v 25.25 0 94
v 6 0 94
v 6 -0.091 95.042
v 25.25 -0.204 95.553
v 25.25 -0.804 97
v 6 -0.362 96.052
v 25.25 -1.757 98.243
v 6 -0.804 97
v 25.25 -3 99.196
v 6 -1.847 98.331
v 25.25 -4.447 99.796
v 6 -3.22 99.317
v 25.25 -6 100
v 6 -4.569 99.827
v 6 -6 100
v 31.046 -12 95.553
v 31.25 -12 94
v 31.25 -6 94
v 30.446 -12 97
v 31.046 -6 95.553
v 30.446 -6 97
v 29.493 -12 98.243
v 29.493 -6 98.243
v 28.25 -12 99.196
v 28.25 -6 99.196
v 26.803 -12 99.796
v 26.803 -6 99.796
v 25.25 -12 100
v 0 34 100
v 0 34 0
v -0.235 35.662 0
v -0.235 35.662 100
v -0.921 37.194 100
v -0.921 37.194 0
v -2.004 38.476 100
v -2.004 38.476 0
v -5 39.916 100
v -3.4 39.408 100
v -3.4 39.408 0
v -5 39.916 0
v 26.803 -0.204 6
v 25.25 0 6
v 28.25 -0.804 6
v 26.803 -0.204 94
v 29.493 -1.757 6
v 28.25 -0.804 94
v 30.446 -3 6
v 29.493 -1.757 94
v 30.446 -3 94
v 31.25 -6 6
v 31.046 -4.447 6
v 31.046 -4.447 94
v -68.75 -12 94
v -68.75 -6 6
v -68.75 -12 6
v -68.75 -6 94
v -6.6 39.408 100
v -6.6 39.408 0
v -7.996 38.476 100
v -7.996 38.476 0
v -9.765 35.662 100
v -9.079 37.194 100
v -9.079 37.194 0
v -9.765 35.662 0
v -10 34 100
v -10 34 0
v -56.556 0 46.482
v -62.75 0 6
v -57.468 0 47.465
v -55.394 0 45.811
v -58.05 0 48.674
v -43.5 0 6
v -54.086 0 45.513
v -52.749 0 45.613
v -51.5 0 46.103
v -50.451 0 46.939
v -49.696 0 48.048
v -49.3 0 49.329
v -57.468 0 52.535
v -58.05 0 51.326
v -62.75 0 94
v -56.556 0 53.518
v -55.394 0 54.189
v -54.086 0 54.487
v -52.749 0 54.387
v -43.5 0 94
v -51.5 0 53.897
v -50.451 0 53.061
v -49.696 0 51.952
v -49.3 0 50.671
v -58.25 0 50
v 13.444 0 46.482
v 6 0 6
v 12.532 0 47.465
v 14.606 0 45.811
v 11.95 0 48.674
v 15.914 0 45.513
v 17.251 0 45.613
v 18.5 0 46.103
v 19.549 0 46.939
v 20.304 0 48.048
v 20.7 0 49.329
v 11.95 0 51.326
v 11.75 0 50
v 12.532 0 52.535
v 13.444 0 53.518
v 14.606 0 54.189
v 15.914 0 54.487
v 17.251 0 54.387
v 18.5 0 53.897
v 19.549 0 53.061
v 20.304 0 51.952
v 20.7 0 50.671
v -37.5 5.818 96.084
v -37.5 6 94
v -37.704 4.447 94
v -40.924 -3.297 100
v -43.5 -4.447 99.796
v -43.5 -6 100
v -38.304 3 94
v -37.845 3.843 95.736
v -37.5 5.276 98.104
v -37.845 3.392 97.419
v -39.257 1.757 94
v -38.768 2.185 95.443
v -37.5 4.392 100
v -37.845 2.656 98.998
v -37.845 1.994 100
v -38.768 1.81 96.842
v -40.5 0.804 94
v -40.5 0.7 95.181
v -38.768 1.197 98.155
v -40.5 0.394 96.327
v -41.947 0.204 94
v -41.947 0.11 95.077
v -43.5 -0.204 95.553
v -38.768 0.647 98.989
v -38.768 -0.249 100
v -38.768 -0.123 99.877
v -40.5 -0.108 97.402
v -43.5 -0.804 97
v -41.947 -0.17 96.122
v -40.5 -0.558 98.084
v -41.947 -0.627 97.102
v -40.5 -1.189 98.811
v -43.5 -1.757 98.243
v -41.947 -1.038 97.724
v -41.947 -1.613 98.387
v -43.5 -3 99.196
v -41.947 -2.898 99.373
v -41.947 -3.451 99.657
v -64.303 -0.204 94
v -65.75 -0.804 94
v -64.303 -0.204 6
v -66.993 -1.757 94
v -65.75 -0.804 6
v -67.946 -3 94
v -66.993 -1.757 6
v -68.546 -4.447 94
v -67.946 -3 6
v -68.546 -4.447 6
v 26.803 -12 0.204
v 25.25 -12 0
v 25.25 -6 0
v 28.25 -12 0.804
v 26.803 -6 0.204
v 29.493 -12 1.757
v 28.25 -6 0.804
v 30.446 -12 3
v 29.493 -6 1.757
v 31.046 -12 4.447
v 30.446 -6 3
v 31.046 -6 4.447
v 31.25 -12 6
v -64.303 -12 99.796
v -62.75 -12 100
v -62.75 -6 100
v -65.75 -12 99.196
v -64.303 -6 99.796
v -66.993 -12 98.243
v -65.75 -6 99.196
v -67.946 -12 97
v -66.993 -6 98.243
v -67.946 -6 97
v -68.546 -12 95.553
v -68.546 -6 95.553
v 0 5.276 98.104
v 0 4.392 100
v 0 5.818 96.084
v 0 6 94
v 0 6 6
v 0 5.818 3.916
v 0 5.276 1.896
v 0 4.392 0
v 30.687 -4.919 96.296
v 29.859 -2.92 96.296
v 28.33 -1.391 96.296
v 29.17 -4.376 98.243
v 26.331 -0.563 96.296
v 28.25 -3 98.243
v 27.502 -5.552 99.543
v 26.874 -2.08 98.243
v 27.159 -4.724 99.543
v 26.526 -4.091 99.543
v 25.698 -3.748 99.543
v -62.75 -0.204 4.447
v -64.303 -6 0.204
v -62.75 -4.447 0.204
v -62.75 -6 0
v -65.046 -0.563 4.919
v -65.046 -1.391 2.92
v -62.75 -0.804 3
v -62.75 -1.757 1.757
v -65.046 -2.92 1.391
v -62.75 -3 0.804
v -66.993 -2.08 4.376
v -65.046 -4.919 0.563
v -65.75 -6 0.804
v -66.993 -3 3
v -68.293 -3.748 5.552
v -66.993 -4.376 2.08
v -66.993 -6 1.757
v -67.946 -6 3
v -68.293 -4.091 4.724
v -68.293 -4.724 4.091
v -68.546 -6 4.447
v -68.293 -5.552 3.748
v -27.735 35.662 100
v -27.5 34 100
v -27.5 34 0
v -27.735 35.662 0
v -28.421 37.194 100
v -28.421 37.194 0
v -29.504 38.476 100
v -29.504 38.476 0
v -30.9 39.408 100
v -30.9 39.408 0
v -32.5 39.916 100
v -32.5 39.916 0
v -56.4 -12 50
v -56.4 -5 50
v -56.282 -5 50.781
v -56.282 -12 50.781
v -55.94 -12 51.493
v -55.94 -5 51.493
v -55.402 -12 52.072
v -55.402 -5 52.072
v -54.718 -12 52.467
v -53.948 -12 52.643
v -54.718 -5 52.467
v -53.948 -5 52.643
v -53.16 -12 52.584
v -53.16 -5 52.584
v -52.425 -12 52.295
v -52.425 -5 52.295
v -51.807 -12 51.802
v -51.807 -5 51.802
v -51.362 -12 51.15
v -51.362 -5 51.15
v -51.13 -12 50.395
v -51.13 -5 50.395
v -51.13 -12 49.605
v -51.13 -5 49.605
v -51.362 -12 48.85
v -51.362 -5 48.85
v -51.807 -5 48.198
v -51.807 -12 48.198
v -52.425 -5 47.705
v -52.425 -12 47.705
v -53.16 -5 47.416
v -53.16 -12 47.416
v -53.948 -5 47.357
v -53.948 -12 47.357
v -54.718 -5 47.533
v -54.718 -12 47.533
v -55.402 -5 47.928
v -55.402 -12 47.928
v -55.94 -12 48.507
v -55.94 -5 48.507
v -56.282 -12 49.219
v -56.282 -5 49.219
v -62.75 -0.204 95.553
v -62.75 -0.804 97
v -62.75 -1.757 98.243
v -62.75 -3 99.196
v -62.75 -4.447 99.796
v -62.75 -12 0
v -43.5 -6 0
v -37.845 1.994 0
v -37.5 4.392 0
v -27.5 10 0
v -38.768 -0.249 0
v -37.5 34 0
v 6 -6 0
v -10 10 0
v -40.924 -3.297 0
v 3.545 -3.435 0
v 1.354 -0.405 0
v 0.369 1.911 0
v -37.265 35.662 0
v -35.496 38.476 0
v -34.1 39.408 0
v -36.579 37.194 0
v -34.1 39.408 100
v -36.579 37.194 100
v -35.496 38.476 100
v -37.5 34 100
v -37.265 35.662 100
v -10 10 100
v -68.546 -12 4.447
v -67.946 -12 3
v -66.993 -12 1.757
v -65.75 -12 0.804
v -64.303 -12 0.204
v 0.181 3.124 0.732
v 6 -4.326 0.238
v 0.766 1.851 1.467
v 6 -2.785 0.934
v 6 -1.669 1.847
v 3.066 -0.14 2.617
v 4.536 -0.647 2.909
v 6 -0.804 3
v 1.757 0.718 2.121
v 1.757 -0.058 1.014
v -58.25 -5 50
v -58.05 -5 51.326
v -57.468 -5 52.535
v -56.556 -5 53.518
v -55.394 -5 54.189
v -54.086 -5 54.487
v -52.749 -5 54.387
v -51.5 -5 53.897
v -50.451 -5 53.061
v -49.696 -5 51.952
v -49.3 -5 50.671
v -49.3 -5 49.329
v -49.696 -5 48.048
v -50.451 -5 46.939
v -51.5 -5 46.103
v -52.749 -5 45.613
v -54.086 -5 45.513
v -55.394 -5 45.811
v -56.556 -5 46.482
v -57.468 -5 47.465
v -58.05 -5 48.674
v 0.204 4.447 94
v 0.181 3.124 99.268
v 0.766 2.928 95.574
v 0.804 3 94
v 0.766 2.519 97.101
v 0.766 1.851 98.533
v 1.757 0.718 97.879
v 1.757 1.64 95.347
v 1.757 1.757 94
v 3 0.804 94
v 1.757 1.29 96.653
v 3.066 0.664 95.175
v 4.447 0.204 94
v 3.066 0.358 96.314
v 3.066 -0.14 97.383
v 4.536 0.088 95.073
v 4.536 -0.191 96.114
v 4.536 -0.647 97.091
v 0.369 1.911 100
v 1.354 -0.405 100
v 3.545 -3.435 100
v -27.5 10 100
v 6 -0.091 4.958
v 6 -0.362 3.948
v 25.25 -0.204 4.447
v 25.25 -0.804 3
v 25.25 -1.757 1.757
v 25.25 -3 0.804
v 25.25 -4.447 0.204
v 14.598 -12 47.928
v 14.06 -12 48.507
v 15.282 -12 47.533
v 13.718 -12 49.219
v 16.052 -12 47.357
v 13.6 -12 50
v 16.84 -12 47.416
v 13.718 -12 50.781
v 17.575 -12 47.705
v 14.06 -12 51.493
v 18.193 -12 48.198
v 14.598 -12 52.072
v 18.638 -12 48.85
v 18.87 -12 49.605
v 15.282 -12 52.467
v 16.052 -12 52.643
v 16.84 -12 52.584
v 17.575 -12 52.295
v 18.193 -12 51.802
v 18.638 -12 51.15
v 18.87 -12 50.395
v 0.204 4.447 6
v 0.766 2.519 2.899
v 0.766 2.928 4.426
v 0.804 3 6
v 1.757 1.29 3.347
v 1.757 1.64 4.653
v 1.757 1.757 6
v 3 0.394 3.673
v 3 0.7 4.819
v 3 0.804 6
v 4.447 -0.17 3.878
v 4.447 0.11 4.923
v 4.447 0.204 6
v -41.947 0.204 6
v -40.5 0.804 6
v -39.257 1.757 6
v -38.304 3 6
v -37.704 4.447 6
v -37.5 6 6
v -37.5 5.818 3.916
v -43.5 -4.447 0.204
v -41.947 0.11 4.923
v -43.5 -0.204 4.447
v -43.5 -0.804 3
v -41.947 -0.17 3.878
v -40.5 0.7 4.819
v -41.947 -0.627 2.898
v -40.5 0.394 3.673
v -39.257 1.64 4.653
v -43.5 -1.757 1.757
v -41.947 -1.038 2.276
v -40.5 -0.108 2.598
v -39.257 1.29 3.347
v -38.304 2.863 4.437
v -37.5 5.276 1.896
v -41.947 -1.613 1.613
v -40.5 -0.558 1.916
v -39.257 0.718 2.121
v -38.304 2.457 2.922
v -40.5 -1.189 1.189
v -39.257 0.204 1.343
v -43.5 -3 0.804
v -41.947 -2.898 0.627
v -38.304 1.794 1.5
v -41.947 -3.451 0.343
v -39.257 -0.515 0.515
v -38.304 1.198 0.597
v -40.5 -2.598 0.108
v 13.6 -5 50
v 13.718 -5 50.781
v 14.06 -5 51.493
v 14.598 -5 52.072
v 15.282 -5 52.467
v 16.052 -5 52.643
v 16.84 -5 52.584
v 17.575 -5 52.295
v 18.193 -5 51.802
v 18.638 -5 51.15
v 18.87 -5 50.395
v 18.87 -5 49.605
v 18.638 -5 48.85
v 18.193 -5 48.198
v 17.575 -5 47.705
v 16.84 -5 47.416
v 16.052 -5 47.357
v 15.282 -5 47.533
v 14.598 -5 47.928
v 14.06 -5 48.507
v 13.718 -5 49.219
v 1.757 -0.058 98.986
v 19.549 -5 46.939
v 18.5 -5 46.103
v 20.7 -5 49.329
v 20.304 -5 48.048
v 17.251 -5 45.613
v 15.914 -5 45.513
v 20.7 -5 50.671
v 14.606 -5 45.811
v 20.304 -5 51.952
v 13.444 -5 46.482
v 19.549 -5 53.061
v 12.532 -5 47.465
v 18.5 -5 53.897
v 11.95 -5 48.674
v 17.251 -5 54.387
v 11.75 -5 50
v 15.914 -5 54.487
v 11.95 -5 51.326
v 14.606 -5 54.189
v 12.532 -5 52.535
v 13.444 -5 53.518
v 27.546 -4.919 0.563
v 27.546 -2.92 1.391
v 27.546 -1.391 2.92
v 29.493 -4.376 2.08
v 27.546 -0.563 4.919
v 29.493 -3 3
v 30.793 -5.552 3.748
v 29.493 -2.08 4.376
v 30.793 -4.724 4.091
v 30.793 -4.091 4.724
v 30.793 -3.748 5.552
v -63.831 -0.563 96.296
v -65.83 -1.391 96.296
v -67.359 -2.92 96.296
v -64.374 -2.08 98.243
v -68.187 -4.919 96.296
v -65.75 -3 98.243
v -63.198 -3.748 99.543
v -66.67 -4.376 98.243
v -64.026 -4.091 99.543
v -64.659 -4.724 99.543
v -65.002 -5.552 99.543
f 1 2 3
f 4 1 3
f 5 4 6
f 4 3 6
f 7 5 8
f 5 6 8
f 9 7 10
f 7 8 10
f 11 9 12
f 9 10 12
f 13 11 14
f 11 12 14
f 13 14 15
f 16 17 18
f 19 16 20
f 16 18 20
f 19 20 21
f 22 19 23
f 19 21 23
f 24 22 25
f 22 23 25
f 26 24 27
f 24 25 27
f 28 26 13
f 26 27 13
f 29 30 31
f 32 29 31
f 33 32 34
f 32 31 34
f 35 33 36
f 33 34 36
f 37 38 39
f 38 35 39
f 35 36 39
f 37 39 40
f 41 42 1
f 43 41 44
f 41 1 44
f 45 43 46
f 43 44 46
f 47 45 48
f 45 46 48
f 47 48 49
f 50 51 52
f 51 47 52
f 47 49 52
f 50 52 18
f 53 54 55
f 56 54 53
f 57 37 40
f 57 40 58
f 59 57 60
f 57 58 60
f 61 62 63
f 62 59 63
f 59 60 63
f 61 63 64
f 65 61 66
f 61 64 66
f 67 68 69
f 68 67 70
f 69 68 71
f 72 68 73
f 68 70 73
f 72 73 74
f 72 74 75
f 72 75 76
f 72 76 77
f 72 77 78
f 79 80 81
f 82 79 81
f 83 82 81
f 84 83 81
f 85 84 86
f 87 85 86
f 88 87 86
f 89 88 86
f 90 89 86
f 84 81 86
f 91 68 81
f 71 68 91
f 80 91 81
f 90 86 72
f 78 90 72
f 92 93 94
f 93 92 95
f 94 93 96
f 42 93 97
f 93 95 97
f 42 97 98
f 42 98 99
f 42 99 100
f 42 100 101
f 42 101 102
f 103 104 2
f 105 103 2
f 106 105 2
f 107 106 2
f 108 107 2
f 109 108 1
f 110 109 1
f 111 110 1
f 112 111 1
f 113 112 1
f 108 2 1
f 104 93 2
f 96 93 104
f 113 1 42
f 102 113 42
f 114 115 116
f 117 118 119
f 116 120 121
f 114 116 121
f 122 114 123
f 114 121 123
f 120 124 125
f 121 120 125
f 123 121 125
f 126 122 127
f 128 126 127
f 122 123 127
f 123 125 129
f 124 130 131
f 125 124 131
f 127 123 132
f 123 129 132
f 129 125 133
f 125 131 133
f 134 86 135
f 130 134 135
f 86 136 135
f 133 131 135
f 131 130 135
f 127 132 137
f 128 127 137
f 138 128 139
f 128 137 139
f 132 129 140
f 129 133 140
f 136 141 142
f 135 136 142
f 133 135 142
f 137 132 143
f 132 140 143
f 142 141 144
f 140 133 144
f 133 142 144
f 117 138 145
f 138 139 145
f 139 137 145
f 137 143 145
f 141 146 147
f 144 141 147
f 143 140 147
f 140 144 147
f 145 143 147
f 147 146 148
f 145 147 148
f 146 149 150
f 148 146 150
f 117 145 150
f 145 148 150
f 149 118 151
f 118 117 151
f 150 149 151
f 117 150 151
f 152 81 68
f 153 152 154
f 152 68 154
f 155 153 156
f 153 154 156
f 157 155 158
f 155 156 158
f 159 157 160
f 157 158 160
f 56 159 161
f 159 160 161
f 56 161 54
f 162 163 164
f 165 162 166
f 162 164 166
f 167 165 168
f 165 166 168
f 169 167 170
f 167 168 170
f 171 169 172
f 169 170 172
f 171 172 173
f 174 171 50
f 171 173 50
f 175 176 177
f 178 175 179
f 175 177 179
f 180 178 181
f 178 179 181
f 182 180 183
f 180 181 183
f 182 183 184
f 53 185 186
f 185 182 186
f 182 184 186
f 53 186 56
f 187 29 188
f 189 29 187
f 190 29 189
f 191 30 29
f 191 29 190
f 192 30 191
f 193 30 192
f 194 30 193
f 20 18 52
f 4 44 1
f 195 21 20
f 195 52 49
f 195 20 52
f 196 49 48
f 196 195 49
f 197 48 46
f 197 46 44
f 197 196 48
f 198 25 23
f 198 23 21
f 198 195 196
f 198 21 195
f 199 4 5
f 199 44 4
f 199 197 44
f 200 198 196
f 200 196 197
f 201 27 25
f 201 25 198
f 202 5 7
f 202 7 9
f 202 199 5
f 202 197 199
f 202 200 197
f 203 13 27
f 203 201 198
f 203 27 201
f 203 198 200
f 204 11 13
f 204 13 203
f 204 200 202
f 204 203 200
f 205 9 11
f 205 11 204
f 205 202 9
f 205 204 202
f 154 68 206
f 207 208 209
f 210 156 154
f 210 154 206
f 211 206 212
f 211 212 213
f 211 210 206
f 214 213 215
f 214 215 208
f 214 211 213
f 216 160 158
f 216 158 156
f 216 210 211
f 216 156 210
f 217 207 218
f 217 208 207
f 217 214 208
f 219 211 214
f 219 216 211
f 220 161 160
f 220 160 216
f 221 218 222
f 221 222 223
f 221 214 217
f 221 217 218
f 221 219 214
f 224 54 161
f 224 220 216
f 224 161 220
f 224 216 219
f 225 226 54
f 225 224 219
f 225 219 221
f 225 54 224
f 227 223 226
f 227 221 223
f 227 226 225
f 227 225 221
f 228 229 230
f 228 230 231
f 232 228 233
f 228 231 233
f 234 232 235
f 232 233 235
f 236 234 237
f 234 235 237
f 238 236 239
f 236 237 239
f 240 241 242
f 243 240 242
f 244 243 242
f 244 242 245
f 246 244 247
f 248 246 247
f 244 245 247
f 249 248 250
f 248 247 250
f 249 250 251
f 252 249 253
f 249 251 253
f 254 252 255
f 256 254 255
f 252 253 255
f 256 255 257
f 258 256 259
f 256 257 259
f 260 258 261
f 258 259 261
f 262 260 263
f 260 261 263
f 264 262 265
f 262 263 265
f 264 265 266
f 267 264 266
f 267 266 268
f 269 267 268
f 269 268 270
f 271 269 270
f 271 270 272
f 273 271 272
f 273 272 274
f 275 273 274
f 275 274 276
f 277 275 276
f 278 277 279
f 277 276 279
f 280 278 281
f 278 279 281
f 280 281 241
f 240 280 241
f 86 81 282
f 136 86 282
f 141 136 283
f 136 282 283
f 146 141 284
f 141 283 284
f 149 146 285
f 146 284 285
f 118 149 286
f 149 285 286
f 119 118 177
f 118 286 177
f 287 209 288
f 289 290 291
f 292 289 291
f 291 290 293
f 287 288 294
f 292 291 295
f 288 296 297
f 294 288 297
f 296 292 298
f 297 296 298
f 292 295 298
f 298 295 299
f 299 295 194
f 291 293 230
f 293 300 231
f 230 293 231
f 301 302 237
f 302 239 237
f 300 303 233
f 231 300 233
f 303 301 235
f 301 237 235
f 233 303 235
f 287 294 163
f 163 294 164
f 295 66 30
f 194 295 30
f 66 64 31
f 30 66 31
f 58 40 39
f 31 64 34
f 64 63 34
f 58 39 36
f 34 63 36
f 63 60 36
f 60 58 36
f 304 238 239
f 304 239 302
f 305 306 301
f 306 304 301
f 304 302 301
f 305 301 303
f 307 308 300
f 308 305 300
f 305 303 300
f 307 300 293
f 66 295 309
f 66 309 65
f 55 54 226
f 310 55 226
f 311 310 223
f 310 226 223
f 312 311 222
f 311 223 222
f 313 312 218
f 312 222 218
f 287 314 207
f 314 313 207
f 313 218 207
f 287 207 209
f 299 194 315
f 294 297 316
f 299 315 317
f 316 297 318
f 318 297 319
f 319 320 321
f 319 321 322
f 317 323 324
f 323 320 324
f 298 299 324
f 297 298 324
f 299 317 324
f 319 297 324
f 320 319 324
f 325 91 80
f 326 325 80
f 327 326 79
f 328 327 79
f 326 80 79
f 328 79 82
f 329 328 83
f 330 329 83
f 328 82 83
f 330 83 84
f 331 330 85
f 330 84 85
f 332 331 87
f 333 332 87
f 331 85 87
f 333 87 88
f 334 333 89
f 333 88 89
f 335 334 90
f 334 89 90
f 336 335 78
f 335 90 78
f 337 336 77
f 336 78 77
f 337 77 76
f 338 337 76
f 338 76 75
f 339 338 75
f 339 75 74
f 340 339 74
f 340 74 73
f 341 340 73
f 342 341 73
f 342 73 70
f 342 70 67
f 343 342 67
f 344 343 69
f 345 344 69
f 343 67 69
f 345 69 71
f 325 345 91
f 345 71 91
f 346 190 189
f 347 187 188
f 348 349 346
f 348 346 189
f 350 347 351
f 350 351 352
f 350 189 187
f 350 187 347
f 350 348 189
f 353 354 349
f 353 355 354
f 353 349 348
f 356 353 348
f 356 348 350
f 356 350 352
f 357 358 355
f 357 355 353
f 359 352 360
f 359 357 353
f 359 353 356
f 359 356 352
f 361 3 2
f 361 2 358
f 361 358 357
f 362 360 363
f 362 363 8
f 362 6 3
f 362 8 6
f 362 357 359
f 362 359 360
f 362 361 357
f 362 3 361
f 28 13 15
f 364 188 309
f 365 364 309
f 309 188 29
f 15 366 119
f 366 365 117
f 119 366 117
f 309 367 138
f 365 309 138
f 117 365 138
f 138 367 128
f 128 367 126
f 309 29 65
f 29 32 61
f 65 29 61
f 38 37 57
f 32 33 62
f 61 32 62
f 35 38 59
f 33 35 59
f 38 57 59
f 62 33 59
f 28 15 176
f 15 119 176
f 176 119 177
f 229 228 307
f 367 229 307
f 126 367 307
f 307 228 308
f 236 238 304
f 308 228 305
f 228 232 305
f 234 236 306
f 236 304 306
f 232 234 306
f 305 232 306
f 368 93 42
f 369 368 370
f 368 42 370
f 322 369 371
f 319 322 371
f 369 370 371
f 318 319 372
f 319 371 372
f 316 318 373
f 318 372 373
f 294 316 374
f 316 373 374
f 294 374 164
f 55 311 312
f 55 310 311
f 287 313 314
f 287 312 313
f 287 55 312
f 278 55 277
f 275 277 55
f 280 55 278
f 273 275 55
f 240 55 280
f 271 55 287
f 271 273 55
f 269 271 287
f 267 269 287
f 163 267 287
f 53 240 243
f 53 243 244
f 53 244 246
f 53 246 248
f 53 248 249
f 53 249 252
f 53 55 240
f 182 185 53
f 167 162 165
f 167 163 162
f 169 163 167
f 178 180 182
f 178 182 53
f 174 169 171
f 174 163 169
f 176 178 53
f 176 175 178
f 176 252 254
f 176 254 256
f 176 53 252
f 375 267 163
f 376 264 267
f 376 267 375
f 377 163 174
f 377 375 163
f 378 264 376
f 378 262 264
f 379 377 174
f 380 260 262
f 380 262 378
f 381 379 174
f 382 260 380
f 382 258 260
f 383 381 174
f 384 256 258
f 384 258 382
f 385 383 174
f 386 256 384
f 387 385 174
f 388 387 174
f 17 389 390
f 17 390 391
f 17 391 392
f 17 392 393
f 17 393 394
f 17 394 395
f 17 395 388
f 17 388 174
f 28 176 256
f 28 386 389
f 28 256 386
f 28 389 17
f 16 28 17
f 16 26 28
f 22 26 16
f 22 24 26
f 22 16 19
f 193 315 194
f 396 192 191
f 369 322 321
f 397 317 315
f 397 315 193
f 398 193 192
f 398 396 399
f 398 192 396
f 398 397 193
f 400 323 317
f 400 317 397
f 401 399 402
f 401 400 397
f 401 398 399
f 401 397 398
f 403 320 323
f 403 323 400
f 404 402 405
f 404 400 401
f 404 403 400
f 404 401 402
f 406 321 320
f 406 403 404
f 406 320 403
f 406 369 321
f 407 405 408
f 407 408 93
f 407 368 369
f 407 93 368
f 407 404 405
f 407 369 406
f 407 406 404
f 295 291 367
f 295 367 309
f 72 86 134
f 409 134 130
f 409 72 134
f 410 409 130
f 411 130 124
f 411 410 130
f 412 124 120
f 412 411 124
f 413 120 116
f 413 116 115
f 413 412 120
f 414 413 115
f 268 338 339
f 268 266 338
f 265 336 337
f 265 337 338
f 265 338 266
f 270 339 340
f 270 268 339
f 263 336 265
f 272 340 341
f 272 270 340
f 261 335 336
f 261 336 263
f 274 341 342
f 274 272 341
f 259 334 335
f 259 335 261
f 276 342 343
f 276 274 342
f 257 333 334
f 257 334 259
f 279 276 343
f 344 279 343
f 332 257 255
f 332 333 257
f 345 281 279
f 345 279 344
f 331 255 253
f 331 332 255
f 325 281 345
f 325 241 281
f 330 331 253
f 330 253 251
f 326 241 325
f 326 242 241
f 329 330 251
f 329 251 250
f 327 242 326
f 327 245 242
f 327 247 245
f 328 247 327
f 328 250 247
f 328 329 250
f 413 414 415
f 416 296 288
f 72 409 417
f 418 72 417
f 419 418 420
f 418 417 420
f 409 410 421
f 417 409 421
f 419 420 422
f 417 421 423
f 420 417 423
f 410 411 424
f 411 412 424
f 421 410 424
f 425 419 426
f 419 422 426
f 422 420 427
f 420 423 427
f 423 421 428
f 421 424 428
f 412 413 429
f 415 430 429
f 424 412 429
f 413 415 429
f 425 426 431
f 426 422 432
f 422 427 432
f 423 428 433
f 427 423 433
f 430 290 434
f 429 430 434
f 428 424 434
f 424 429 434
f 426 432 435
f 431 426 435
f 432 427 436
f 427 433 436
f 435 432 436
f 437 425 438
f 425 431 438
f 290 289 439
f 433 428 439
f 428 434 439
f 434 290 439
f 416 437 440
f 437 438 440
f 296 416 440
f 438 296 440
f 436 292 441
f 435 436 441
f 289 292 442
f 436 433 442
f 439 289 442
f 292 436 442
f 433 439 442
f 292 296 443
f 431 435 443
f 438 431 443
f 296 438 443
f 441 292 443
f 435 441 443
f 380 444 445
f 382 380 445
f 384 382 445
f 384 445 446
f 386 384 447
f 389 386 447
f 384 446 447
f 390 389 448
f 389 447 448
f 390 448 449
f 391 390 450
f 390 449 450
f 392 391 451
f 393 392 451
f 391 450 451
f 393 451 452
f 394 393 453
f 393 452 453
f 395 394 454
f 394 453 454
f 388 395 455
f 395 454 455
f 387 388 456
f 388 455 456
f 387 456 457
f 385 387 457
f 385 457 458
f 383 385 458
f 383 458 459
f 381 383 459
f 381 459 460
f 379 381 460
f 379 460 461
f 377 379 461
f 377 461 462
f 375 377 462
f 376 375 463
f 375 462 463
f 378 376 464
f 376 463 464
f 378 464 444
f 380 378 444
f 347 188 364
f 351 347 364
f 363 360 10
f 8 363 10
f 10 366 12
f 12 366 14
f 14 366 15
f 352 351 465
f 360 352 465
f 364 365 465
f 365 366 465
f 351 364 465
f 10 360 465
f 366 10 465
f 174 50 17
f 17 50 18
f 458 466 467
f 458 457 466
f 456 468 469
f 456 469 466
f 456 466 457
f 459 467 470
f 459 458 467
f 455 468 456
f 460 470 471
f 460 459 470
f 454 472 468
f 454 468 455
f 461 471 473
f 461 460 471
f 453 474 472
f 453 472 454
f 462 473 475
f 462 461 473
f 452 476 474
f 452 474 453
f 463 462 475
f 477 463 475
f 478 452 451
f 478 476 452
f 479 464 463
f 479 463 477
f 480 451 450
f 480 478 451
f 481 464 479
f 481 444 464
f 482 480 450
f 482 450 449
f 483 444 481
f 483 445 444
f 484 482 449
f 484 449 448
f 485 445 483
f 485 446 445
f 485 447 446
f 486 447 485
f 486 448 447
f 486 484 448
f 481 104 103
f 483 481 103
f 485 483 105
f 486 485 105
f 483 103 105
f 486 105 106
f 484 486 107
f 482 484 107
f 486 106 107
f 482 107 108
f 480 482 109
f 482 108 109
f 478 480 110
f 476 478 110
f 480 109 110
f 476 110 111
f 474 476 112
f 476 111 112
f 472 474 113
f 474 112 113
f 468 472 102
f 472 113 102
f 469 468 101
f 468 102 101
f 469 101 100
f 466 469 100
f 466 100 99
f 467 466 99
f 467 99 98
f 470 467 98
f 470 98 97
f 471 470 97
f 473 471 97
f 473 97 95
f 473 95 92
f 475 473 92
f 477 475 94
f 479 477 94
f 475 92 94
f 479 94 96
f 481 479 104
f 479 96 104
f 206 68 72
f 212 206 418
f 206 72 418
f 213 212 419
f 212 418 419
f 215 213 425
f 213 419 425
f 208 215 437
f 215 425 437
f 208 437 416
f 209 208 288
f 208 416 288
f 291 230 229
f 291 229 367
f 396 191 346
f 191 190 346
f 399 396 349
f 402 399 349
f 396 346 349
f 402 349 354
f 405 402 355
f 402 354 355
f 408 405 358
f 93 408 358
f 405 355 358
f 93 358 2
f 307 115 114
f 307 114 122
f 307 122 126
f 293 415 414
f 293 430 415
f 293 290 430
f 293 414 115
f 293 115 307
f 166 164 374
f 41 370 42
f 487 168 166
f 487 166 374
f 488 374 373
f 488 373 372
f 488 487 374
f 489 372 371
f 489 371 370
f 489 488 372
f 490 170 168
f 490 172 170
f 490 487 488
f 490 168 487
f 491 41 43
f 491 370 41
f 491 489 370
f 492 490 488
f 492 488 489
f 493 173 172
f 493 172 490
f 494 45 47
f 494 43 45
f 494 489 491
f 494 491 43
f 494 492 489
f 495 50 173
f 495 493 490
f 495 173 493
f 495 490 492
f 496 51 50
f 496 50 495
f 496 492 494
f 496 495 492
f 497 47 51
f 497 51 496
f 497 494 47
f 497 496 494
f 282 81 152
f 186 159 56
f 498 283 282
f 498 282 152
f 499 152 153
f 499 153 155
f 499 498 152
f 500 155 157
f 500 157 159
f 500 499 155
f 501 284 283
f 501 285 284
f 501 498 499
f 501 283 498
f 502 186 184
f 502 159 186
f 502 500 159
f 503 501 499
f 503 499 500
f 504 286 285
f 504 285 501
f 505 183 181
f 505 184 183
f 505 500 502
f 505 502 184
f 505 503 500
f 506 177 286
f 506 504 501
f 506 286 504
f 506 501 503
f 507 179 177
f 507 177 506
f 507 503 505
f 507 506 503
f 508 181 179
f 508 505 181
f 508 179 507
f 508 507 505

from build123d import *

# Parameters (mm, degrees)
BOSS_EXTRUDE1_DEPTH = 100
SKETCH2_W           = 100
SKETCH2_H           = 100
BOSS_EXTRUDE2_DEPTH = 12
SKETCH3_R           = 4.5
CUT_EXTRUDE1_DEPTH  = 5
SKETCH4_R           = 2.65
CUT_EXTRUDE2_DEPTH  = 7
FILLET1_R           = 6
FILLET3_R           = 6
FILLET4_R           = 6


with BuildPart() as part:
    # Sketch1 → Boss-Extrude1 (new body)
    with BuildSketch(Plane.XY):
        Polygon((0, 0), (-37.5, 0), (-37.5, 40), (-27.5, 40), (-27.5, 10), (-10, 10), (-10, 40), (0, 40), align=None)
    extrude(amount=BOSS_EXTRUDE1_DEPTH)

    # Sketch2 → Boss-Extrude2 (add)
    with BuildSketch(Plane.XZ):
        with Locations((-18.75, 50)):
            Rectangle(SKETCH2_W, SKETCH2_H)
    extrude(amount=BOSS_EXTRUDE2_DEPTH)

    # Sketch3 → Cut-Extrude1 (cut)
    with BuildSketch(Plane(origin=(0, 0, 0), x_dir=(1, 0, 0), z_dir=(0, 1, 0))):
        with Locations(Location((16.25, -50, 0), (0, 0, 180))):
            Circle(SKETCH3_R)
        with Locations(Location((-53.75, -50, 0), (0, 0, 180))):
            Circle(SKETCH3_R)
    extrude(amount=-CUT_EXTRUDE1_DEPTH, mode=Mode.SUBTRACT)

    # Sketch4 → Cut-Extrude2 (cut)
    with BuildSketch(Plane(origin=(0, -5, 0), x_dir=(1, 0, 0), z_dir=(0, 1, 0))):
        with Locations(Location((16.25, -50, 0), (0, 0, 180))):
            Circle(SKETCH4_R)
        with Locations(Location((-53.75, -50, 0), (0, 0, 180))):
            Circle(SKETCH4_R)
    extrude(amount=-CUT_EXTRUDE2_DEPTH, mode=Mode.SUBTRACT)

    # Fillet1
    # the kernel refuses this fillet: 6 mm, written as the material it takes off along each edge
    with BuildSketch(Plane(origin=(25.25, -6, 6), x_dir=(0, 1, 0), z_dir=(1, 0, 0))) as fillet1_piece_1_section:
        Polygon((0, 0), (FILLET1_R, 0), (FILLET1_R, -FILLET1_R), (0, -FILLET1_R), align=None)
    fillet1_piece_1 = extrude(amount=FILLET1_R, mode=Mode.PRIVATE)
    fillet1_piece_1 = fillet1_piece_1 - Plane(origin=(25.25, -6, 6), x_dir=(0, -0.7071067811865475, 0.7071067811865475), z_dir=(1, 0, 0)) * Sphere(FILLET1_R, mode=Mode.PRIVATE)
    add(fillet1_piece_1, mode=Mode.SUBTRACT)
    with BuildSketch(Plane(origin=(25.25, -6, 94), x_dir=(1, 0, 0), z_dir=(0, 0, 1))) as fillet1_piece_2_section:
        Polygon((0, 0), (FILLET1_R, 0), (FILLET1_R, FILLET1_R), (0, FILLET1_R), align=None)
    fillet1_piece_2 = extrude(amount=FILLET1_R, mode=Mode.PRIVATE)
    fillet1_piece_2 = fillet1_piece_2 - Plane(origin=(25.25, -6, 94), x_dir=(-0.7071067811865474, -0.7071067811865477, 0), z_dir=(0, 0, 1)) * Sphere(FILLET1_R, mode=Mode.PRIVATE)
    add(fillet1_piece_2, mode=Mode.SUBTRACT)
    with BuildSketch(Plane(origin=(-62.75, -6, 94), x_dir=(-1, 0, 0), z_dir=(0, 0, 1))) as fillet1_piece_3_section:
        Polygon((0, 0), (FILLET1_R, 0), (FILLET1_R, -FILLET1_R), (0, -FILLET1_R), align=None)
    fillet1_piece_3 = extrude(amount=FILLET1_R, mode=Mode.PRIVATE)
    fillet1_piece_3 = fillet1_piece_3 - Plane(origin=(-62.75, -6, 94), x_dir=(0.7071067811865477, -0.7071067811865474, 0), z_dir=(0, 0, 1)) * Sphere(FILLET1_R, mode=Mode.PRIVATE)
    add(fillet1_piece_3, mode=Mode.SUBTRACT)
    with BuildSketch(Plane(origin=(-62.75, -6, 6), x_dir=(0, 1, 0), z_dir=(-1, 0, 0))) as fillet1_piece_4_section:
        Polygon((0, 0), (FILLET1_R, 0), (FILLET1_R, FILLET1_R), (0, FILLET1_R), align=None)
    fillet1_piece_4 = extrude(amount=FILLET1_R, mode=Mode.PRIVATE)
    fillet1_piece_4 = fillet1_piece_4 - Plane(origin=(-62.75, -6, 6), x_dir=(0, -0.7071067811865475, 0.7071067811865475), z_dir=(-1, 0, 0)) * Sphere(FILLET1_R, mode=Mode.PRIVATE)
    add(fillet1_piece_4, mode=Mode.SUBTRACT)
    with BuildSketch(Plane(origin=(31.25, -6, 0), x_dir=(0, 0, 1), z_dir=(0, -1, 0)), Plane(origin=(31.25, -6, 100), x_dir=(-1, 0, 0), z_dir=(0, -1, 0))) as fillet1_piece_5:
        with BuildLine():
            CenterArc((FILLET1_R, FILLET1_R), FILLET1_R, 180, 90)
            Line((0, FILLET1_R), (0, 0))
            Line((0, 0), (FILLET1_R, 0))
        make_face()
    extrude(amount=21, mode=Mode.SUBTRACT)
    with BuildSketch(Plane(origin=(25.25, 0, 0), x_dir=(0, 0, 1), z_dir=(-1, 0, 0)), Plane(origin=(-37.5, 0, 0), x_dir=(0, 0, 1), z_dir=(-1, 0, 0))) as fillet1_piece_6:
        with BuildLine():
            CenterArc((FILLET1_R, -FILLET1_R), FILLET1_R, 90, 90)
            Line((0, -FILLET1_R), (0, 0))
            Line((0, 0), (FILLET1_R, 0))
        make_face()
    extrude(amount=25.25, mode=Mode.SUBTRACT)
    with BuildSketch(Plane(origin=(31.25, 0, 94), x_dir=(0, -1, 0), z_dir=(0, 0, -1)), Plane(origin=(-68.75, 0, 6), x_dir=(0, -1, 0), z_dir=(0, 0, 1))) as fillet1_piece_7:
        with BuildLine():
            CenterArc((FILLET1_R, FILLET1_R), FILLET1_R, 180, 90)
            Line((0, FILLET1_R), (0, 0))
            Line((0, 0), (FILLET1_R, 0))
        make_face()
    extrude(amount=88, mode=Mode.SUBTRACT)
    with BuildSketch(Plane(origin=(0, 0, 100), x_dir=(0, -1, 0), z_dir=(1, 0, 0)), Plane(origin=(-62.75, 0, 100), x_dir=(0, -1, 0), z_dir=(1, 0, 0))) as fillet1_piece_8:
        with BuildLine():
            CenterArc((FILLET1_R, FILLET1_R), FILLET1_R, 180, 90)
            Line((0, FILLET1_R), (0, 0))
            Line((0, 0), (FILLET1_R, 0))
        make_face()
    extrude(amount=25.25, mode=Mode.SUBTRACT)
    with BuildSketch(Plane(origin=(-68.75, -6, 100), x_dir=(1, 0, 0), z_dir=(0, -1, 0)), Plane(origin=(-68.75, -6, 0), x_dir=(0, 0, 1), z_dir=(0, -1, 0))) as fillet1_piece_9:
        with BuildLine():
            CenterArc((FILLET1_R, -FILLET1_R), FILLET1_R, 90, 90)
            Line((0, -FILLET1_R), (0, 0))
            Line((0, 0), (FILLET1_R, 0))
        make_face()
    extrude(amount=21, mode=Mode.SUBTRACT)
    with BuildSketch(Plane(origin=(-10, 40, -15), x_dir=(1, 0, 0), z_dir=(0, 0, 1)), Plane(origin=(-27.5, 40, -15), x_dir=(0, -1, 0), z_dir=(0, 0, 1)), Plane(origin=(-37.5, 40, -15), x_dir=(1, 0, 0), z_dir=(0, 0, 1)), Plane(origin=(0, 40, -15), x_dir=(0, -1, 0), z_dir=(0, 0, 1))) as fillet1_piece_10:
        with BuildLine():
            CenterArc((FILLET1_R, -FILLET1_R), FILLET1_R, 90, 90)
            Line((0, -FILLET1_R), (0, 0))
            Line((0, 0), (FILLET1_R, 0))
        make_face()
    extrude(amount=130, mode=Mode.SUBTRACT)

    # Fillet3
    fillet3_edges = [part.edges().sort_by_distance(p)[0] for p in [
        (0, 0, 50),
        (0, -1.757359313, 1.757359313),
        (0, -1.757359313, 98.242640687),
    ]]
    fillet(fillet3_edges, radius=FILLET3_R)

    # Fillet4
    # the kernel refuses this fillet: 6 mm, written as the material it adds along each edge
    with BuildSketch(Plane(origin=(-37.5, 0, 6), x_dir=(0, 1, 0), z_dir=(0, 0, 1))) as fillet4_piece_1:
        with BuildLine():
            CenterArc((FILLET4_R, FILLET4_R), FILLET4_R, 180, 90)
            Line((0, FILLET4_R), (0, 0))
            Line((0, 0), (FILLET4_R, 0))
        make_face()
    extrude(amount=88)
    with BuildSketch(Plane(origin=(-37.5, -6, 94), x_dir=(0, 1, 0), z_dir=(0, 0, -1))) as fillet4_piece_2_section:
        with BuildLine():
            CenterArc((6 + FILLET4_R, -FILLET4_R), FILLET4_R, 90, 90)
            Line((6 + FILLET4_R, 0), (6, 0))
            Line((6, 0), (6, -FILLET4_R))
        make_face()
    fillet4_piece_2 = revolve(axis=Axis((-37.5, -6, 94), (1, 0, 0)), revolution_arc=233.296989237, mode=Mode.PRIVATE)
    fillet4_piece_2 = split(fillet4_piece_2, bisect_by=Plane(origin=(-39.369769667, -1.500366283, 100), z_dir=(0, 0, -1)), keep=Keep.TOP, mode=Mode.PRIVATE)
    fillet4_piece_2 = split(fillet4_piece_2, bisect_by=Plane(origin=(-39.369769667, -12, 98.499633777), z_dir=(0, 1, 0)), keep=Keep.TOP, mode=Mode.PRIVATE)
    add(fillet4_piece_2)
    with BuildSketch(Plane(origin=(-37.5, -6, 6), x_dir=(0, 1, 0), z_dir=(0, 0, 1))) as fillet4_piece_3_section:
        with BuildLine():
            CenterArc((6 + FILLET4_R, FILLET4_R), FILLET4_R, 180, 90)
            Line((6, FILLET4_R), (6, 0))
            Line((6, 0), (6 + FILLET4_R, 0))
        make_face()
    fillet4_piece_3 = revolve(axis=Axis((-37.5, -6, 6), (-1, 0, 0)), revolution_arc=233.296989237, mode=Mode.PRIVATE)
    fillet4_piece_3 = split(fillet4_piece_3, bisect_by=Plane(origin=(-38.503801185, -12, 3.658909584), z_dir=(0, 1, 0)), keep=Keep.TOP, mode=Mode.PRIVATE)
    fillet4_piece_3 = split(fillet4_piece_3, bisect_by=Plane(origin=(-38.503801185, 1.318651502, 0), z_dir=(0, 0, 1)), keep=Keep.TOP, mode=Mode.PRIVATE)
    add(fillet4_piece_3)


solid = part.part
